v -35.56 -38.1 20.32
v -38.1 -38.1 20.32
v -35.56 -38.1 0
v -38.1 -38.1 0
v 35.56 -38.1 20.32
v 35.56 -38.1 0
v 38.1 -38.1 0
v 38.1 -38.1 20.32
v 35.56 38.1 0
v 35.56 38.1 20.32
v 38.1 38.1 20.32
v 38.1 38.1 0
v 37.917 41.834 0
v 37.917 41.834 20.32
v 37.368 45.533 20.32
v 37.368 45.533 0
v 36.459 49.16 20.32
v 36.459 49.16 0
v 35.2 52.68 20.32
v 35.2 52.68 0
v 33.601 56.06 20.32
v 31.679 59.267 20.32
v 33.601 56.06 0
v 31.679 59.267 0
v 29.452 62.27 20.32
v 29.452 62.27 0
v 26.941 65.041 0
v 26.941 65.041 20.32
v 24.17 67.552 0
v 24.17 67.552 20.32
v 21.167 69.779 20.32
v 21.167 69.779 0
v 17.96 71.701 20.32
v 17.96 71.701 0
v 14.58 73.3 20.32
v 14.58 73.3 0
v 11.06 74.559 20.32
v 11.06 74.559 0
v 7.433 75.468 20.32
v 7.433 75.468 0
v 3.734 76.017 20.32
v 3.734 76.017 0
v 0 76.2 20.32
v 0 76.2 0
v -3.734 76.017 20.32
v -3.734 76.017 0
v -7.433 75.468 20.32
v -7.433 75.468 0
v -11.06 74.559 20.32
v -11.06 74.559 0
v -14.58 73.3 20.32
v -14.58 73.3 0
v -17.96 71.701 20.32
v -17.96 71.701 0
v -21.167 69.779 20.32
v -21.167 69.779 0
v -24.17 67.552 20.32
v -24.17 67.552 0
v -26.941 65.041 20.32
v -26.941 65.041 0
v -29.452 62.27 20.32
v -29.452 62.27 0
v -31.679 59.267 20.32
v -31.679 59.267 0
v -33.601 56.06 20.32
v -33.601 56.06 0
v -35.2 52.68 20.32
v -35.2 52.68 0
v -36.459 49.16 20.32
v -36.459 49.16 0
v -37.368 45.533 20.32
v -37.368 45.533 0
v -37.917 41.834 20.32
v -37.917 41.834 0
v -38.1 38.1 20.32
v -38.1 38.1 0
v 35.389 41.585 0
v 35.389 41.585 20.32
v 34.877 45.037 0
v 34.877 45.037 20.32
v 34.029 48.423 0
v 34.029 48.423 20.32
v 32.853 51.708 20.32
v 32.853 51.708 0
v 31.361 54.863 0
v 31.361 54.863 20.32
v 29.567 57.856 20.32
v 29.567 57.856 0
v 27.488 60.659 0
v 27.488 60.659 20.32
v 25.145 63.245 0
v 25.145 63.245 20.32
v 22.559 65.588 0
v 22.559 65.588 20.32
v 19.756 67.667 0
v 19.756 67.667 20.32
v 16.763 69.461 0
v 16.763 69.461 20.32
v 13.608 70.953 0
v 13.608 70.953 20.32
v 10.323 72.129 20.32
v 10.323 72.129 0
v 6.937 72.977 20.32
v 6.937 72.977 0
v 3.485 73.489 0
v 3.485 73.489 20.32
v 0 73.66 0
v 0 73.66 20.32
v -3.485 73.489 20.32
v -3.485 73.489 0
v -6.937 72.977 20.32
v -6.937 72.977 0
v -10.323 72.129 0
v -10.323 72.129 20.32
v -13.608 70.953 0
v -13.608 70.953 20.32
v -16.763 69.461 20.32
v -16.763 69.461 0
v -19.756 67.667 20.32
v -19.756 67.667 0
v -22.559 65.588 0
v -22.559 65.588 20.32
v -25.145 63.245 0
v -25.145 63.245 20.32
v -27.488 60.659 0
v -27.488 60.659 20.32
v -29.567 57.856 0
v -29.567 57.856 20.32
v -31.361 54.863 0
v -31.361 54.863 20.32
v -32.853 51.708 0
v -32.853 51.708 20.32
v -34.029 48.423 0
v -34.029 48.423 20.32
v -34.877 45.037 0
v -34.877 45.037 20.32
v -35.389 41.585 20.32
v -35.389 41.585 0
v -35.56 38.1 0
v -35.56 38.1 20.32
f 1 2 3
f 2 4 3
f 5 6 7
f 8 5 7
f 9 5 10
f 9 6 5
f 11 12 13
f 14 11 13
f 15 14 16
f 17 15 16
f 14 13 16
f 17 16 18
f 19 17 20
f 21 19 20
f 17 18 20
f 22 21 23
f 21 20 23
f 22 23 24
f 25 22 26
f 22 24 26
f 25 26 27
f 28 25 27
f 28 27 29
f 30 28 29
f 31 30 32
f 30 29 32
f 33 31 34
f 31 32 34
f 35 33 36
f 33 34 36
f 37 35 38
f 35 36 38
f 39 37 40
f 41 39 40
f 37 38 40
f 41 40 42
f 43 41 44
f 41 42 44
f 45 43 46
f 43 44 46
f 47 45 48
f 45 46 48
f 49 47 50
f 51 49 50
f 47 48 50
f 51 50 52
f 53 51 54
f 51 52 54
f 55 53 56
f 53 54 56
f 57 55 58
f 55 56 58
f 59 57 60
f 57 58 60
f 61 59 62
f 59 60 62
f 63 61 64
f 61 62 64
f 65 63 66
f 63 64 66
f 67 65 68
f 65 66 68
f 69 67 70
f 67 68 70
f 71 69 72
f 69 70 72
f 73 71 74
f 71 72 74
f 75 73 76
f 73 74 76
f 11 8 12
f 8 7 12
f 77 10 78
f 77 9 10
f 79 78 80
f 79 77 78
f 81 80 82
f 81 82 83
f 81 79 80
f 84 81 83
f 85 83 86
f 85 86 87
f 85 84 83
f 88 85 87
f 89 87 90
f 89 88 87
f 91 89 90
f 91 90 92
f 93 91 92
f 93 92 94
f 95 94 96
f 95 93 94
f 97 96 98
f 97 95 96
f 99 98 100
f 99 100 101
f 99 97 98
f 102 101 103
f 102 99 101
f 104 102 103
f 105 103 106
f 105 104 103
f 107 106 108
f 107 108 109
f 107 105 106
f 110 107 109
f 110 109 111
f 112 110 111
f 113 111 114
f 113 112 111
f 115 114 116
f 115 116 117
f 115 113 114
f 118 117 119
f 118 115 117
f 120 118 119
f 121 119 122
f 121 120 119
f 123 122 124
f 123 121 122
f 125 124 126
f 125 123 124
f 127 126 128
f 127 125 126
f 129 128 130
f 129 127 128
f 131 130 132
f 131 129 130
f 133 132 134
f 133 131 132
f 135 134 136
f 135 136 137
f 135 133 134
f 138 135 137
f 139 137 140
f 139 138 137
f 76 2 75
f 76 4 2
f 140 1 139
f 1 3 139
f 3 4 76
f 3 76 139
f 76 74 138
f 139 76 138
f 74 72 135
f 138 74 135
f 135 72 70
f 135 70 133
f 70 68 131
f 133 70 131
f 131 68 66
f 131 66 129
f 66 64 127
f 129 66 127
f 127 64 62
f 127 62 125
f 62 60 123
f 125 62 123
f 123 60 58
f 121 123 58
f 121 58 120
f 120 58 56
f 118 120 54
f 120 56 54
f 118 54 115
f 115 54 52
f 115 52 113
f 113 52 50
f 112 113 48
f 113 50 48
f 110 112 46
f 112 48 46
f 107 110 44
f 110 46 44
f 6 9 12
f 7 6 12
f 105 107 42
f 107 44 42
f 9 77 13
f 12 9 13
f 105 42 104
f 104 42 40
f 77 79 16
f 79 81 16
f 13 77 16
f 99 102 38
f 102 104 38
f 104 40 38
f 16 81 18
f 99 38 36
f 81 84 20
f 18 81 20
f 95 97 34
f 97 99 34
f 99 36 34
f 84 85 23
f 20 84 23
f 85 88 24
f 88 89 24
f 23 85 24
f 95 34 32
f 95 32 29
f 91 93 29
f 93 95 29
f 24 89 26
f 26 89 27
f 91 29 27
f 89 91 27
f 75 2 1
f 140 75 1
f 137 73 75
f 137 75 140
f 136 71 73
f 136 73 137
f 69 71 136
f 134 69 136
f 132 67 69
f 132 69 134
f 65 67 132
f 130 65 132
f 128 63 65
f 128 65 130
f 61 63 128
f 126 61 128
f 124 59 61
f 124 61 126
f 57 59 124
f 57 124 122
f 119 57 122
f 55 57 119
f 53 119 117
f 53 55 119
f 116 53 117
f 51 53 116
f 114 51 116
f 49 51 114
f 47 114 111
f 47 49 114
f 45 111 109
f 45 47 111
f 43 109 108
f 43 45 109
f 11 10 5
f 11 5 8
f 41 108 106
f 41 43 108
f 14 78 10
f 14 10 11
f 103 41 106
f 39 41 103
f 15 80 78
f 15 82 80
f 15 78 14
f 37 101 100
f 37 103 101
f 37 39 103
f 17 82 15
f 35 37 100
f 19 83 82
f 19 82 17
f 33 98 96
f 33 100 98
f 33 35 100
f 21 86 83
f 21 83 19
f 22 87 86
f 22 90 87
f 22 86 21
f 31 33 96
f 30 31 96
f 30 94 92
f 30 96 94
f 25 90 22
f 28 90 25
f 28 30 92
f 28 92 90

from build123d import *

# Parameters (mm, degrees)
F0_W     = 76.2
F0_H     = 76.2
F1_DEPTH = 20.066
F2_DEPTH = 0.254
F3_T     = -2.54


with BuildPart() as f1:
    # F0 (on Top) → F1 (new body)
    with BuildSketch(Plane.XY):
        Rectangle(F0_W, F0_H)
        with BuildLine():
            Line((-38.1, 38.1), (38.1, 38.1))
            ThreePointArc((38.1, 38.1), (0, 76.2), (-38.1, 38.1))
        make_face()
    extrude(amount=F1_DEPTH)

    # F2 (add): a face of the model
    f2_faces = [f1.faces().sort_by_distance(p)[0] for p in [
        (0, 15.3025411539, 20.066),
    ]]
    extrude(f2_faces, amount=F2_DEPTH)

    # F3
    f3_openings = [f1.faces().sort_by_distance(p)[0] for p in [
        (0, -38.1, 10.16),
        (0, 15.302541, 20.32),
        (0, 15.302541, 0),
    ]]
    offset(amount=F3_T, openings=f3_openings)


solid = f1.part
